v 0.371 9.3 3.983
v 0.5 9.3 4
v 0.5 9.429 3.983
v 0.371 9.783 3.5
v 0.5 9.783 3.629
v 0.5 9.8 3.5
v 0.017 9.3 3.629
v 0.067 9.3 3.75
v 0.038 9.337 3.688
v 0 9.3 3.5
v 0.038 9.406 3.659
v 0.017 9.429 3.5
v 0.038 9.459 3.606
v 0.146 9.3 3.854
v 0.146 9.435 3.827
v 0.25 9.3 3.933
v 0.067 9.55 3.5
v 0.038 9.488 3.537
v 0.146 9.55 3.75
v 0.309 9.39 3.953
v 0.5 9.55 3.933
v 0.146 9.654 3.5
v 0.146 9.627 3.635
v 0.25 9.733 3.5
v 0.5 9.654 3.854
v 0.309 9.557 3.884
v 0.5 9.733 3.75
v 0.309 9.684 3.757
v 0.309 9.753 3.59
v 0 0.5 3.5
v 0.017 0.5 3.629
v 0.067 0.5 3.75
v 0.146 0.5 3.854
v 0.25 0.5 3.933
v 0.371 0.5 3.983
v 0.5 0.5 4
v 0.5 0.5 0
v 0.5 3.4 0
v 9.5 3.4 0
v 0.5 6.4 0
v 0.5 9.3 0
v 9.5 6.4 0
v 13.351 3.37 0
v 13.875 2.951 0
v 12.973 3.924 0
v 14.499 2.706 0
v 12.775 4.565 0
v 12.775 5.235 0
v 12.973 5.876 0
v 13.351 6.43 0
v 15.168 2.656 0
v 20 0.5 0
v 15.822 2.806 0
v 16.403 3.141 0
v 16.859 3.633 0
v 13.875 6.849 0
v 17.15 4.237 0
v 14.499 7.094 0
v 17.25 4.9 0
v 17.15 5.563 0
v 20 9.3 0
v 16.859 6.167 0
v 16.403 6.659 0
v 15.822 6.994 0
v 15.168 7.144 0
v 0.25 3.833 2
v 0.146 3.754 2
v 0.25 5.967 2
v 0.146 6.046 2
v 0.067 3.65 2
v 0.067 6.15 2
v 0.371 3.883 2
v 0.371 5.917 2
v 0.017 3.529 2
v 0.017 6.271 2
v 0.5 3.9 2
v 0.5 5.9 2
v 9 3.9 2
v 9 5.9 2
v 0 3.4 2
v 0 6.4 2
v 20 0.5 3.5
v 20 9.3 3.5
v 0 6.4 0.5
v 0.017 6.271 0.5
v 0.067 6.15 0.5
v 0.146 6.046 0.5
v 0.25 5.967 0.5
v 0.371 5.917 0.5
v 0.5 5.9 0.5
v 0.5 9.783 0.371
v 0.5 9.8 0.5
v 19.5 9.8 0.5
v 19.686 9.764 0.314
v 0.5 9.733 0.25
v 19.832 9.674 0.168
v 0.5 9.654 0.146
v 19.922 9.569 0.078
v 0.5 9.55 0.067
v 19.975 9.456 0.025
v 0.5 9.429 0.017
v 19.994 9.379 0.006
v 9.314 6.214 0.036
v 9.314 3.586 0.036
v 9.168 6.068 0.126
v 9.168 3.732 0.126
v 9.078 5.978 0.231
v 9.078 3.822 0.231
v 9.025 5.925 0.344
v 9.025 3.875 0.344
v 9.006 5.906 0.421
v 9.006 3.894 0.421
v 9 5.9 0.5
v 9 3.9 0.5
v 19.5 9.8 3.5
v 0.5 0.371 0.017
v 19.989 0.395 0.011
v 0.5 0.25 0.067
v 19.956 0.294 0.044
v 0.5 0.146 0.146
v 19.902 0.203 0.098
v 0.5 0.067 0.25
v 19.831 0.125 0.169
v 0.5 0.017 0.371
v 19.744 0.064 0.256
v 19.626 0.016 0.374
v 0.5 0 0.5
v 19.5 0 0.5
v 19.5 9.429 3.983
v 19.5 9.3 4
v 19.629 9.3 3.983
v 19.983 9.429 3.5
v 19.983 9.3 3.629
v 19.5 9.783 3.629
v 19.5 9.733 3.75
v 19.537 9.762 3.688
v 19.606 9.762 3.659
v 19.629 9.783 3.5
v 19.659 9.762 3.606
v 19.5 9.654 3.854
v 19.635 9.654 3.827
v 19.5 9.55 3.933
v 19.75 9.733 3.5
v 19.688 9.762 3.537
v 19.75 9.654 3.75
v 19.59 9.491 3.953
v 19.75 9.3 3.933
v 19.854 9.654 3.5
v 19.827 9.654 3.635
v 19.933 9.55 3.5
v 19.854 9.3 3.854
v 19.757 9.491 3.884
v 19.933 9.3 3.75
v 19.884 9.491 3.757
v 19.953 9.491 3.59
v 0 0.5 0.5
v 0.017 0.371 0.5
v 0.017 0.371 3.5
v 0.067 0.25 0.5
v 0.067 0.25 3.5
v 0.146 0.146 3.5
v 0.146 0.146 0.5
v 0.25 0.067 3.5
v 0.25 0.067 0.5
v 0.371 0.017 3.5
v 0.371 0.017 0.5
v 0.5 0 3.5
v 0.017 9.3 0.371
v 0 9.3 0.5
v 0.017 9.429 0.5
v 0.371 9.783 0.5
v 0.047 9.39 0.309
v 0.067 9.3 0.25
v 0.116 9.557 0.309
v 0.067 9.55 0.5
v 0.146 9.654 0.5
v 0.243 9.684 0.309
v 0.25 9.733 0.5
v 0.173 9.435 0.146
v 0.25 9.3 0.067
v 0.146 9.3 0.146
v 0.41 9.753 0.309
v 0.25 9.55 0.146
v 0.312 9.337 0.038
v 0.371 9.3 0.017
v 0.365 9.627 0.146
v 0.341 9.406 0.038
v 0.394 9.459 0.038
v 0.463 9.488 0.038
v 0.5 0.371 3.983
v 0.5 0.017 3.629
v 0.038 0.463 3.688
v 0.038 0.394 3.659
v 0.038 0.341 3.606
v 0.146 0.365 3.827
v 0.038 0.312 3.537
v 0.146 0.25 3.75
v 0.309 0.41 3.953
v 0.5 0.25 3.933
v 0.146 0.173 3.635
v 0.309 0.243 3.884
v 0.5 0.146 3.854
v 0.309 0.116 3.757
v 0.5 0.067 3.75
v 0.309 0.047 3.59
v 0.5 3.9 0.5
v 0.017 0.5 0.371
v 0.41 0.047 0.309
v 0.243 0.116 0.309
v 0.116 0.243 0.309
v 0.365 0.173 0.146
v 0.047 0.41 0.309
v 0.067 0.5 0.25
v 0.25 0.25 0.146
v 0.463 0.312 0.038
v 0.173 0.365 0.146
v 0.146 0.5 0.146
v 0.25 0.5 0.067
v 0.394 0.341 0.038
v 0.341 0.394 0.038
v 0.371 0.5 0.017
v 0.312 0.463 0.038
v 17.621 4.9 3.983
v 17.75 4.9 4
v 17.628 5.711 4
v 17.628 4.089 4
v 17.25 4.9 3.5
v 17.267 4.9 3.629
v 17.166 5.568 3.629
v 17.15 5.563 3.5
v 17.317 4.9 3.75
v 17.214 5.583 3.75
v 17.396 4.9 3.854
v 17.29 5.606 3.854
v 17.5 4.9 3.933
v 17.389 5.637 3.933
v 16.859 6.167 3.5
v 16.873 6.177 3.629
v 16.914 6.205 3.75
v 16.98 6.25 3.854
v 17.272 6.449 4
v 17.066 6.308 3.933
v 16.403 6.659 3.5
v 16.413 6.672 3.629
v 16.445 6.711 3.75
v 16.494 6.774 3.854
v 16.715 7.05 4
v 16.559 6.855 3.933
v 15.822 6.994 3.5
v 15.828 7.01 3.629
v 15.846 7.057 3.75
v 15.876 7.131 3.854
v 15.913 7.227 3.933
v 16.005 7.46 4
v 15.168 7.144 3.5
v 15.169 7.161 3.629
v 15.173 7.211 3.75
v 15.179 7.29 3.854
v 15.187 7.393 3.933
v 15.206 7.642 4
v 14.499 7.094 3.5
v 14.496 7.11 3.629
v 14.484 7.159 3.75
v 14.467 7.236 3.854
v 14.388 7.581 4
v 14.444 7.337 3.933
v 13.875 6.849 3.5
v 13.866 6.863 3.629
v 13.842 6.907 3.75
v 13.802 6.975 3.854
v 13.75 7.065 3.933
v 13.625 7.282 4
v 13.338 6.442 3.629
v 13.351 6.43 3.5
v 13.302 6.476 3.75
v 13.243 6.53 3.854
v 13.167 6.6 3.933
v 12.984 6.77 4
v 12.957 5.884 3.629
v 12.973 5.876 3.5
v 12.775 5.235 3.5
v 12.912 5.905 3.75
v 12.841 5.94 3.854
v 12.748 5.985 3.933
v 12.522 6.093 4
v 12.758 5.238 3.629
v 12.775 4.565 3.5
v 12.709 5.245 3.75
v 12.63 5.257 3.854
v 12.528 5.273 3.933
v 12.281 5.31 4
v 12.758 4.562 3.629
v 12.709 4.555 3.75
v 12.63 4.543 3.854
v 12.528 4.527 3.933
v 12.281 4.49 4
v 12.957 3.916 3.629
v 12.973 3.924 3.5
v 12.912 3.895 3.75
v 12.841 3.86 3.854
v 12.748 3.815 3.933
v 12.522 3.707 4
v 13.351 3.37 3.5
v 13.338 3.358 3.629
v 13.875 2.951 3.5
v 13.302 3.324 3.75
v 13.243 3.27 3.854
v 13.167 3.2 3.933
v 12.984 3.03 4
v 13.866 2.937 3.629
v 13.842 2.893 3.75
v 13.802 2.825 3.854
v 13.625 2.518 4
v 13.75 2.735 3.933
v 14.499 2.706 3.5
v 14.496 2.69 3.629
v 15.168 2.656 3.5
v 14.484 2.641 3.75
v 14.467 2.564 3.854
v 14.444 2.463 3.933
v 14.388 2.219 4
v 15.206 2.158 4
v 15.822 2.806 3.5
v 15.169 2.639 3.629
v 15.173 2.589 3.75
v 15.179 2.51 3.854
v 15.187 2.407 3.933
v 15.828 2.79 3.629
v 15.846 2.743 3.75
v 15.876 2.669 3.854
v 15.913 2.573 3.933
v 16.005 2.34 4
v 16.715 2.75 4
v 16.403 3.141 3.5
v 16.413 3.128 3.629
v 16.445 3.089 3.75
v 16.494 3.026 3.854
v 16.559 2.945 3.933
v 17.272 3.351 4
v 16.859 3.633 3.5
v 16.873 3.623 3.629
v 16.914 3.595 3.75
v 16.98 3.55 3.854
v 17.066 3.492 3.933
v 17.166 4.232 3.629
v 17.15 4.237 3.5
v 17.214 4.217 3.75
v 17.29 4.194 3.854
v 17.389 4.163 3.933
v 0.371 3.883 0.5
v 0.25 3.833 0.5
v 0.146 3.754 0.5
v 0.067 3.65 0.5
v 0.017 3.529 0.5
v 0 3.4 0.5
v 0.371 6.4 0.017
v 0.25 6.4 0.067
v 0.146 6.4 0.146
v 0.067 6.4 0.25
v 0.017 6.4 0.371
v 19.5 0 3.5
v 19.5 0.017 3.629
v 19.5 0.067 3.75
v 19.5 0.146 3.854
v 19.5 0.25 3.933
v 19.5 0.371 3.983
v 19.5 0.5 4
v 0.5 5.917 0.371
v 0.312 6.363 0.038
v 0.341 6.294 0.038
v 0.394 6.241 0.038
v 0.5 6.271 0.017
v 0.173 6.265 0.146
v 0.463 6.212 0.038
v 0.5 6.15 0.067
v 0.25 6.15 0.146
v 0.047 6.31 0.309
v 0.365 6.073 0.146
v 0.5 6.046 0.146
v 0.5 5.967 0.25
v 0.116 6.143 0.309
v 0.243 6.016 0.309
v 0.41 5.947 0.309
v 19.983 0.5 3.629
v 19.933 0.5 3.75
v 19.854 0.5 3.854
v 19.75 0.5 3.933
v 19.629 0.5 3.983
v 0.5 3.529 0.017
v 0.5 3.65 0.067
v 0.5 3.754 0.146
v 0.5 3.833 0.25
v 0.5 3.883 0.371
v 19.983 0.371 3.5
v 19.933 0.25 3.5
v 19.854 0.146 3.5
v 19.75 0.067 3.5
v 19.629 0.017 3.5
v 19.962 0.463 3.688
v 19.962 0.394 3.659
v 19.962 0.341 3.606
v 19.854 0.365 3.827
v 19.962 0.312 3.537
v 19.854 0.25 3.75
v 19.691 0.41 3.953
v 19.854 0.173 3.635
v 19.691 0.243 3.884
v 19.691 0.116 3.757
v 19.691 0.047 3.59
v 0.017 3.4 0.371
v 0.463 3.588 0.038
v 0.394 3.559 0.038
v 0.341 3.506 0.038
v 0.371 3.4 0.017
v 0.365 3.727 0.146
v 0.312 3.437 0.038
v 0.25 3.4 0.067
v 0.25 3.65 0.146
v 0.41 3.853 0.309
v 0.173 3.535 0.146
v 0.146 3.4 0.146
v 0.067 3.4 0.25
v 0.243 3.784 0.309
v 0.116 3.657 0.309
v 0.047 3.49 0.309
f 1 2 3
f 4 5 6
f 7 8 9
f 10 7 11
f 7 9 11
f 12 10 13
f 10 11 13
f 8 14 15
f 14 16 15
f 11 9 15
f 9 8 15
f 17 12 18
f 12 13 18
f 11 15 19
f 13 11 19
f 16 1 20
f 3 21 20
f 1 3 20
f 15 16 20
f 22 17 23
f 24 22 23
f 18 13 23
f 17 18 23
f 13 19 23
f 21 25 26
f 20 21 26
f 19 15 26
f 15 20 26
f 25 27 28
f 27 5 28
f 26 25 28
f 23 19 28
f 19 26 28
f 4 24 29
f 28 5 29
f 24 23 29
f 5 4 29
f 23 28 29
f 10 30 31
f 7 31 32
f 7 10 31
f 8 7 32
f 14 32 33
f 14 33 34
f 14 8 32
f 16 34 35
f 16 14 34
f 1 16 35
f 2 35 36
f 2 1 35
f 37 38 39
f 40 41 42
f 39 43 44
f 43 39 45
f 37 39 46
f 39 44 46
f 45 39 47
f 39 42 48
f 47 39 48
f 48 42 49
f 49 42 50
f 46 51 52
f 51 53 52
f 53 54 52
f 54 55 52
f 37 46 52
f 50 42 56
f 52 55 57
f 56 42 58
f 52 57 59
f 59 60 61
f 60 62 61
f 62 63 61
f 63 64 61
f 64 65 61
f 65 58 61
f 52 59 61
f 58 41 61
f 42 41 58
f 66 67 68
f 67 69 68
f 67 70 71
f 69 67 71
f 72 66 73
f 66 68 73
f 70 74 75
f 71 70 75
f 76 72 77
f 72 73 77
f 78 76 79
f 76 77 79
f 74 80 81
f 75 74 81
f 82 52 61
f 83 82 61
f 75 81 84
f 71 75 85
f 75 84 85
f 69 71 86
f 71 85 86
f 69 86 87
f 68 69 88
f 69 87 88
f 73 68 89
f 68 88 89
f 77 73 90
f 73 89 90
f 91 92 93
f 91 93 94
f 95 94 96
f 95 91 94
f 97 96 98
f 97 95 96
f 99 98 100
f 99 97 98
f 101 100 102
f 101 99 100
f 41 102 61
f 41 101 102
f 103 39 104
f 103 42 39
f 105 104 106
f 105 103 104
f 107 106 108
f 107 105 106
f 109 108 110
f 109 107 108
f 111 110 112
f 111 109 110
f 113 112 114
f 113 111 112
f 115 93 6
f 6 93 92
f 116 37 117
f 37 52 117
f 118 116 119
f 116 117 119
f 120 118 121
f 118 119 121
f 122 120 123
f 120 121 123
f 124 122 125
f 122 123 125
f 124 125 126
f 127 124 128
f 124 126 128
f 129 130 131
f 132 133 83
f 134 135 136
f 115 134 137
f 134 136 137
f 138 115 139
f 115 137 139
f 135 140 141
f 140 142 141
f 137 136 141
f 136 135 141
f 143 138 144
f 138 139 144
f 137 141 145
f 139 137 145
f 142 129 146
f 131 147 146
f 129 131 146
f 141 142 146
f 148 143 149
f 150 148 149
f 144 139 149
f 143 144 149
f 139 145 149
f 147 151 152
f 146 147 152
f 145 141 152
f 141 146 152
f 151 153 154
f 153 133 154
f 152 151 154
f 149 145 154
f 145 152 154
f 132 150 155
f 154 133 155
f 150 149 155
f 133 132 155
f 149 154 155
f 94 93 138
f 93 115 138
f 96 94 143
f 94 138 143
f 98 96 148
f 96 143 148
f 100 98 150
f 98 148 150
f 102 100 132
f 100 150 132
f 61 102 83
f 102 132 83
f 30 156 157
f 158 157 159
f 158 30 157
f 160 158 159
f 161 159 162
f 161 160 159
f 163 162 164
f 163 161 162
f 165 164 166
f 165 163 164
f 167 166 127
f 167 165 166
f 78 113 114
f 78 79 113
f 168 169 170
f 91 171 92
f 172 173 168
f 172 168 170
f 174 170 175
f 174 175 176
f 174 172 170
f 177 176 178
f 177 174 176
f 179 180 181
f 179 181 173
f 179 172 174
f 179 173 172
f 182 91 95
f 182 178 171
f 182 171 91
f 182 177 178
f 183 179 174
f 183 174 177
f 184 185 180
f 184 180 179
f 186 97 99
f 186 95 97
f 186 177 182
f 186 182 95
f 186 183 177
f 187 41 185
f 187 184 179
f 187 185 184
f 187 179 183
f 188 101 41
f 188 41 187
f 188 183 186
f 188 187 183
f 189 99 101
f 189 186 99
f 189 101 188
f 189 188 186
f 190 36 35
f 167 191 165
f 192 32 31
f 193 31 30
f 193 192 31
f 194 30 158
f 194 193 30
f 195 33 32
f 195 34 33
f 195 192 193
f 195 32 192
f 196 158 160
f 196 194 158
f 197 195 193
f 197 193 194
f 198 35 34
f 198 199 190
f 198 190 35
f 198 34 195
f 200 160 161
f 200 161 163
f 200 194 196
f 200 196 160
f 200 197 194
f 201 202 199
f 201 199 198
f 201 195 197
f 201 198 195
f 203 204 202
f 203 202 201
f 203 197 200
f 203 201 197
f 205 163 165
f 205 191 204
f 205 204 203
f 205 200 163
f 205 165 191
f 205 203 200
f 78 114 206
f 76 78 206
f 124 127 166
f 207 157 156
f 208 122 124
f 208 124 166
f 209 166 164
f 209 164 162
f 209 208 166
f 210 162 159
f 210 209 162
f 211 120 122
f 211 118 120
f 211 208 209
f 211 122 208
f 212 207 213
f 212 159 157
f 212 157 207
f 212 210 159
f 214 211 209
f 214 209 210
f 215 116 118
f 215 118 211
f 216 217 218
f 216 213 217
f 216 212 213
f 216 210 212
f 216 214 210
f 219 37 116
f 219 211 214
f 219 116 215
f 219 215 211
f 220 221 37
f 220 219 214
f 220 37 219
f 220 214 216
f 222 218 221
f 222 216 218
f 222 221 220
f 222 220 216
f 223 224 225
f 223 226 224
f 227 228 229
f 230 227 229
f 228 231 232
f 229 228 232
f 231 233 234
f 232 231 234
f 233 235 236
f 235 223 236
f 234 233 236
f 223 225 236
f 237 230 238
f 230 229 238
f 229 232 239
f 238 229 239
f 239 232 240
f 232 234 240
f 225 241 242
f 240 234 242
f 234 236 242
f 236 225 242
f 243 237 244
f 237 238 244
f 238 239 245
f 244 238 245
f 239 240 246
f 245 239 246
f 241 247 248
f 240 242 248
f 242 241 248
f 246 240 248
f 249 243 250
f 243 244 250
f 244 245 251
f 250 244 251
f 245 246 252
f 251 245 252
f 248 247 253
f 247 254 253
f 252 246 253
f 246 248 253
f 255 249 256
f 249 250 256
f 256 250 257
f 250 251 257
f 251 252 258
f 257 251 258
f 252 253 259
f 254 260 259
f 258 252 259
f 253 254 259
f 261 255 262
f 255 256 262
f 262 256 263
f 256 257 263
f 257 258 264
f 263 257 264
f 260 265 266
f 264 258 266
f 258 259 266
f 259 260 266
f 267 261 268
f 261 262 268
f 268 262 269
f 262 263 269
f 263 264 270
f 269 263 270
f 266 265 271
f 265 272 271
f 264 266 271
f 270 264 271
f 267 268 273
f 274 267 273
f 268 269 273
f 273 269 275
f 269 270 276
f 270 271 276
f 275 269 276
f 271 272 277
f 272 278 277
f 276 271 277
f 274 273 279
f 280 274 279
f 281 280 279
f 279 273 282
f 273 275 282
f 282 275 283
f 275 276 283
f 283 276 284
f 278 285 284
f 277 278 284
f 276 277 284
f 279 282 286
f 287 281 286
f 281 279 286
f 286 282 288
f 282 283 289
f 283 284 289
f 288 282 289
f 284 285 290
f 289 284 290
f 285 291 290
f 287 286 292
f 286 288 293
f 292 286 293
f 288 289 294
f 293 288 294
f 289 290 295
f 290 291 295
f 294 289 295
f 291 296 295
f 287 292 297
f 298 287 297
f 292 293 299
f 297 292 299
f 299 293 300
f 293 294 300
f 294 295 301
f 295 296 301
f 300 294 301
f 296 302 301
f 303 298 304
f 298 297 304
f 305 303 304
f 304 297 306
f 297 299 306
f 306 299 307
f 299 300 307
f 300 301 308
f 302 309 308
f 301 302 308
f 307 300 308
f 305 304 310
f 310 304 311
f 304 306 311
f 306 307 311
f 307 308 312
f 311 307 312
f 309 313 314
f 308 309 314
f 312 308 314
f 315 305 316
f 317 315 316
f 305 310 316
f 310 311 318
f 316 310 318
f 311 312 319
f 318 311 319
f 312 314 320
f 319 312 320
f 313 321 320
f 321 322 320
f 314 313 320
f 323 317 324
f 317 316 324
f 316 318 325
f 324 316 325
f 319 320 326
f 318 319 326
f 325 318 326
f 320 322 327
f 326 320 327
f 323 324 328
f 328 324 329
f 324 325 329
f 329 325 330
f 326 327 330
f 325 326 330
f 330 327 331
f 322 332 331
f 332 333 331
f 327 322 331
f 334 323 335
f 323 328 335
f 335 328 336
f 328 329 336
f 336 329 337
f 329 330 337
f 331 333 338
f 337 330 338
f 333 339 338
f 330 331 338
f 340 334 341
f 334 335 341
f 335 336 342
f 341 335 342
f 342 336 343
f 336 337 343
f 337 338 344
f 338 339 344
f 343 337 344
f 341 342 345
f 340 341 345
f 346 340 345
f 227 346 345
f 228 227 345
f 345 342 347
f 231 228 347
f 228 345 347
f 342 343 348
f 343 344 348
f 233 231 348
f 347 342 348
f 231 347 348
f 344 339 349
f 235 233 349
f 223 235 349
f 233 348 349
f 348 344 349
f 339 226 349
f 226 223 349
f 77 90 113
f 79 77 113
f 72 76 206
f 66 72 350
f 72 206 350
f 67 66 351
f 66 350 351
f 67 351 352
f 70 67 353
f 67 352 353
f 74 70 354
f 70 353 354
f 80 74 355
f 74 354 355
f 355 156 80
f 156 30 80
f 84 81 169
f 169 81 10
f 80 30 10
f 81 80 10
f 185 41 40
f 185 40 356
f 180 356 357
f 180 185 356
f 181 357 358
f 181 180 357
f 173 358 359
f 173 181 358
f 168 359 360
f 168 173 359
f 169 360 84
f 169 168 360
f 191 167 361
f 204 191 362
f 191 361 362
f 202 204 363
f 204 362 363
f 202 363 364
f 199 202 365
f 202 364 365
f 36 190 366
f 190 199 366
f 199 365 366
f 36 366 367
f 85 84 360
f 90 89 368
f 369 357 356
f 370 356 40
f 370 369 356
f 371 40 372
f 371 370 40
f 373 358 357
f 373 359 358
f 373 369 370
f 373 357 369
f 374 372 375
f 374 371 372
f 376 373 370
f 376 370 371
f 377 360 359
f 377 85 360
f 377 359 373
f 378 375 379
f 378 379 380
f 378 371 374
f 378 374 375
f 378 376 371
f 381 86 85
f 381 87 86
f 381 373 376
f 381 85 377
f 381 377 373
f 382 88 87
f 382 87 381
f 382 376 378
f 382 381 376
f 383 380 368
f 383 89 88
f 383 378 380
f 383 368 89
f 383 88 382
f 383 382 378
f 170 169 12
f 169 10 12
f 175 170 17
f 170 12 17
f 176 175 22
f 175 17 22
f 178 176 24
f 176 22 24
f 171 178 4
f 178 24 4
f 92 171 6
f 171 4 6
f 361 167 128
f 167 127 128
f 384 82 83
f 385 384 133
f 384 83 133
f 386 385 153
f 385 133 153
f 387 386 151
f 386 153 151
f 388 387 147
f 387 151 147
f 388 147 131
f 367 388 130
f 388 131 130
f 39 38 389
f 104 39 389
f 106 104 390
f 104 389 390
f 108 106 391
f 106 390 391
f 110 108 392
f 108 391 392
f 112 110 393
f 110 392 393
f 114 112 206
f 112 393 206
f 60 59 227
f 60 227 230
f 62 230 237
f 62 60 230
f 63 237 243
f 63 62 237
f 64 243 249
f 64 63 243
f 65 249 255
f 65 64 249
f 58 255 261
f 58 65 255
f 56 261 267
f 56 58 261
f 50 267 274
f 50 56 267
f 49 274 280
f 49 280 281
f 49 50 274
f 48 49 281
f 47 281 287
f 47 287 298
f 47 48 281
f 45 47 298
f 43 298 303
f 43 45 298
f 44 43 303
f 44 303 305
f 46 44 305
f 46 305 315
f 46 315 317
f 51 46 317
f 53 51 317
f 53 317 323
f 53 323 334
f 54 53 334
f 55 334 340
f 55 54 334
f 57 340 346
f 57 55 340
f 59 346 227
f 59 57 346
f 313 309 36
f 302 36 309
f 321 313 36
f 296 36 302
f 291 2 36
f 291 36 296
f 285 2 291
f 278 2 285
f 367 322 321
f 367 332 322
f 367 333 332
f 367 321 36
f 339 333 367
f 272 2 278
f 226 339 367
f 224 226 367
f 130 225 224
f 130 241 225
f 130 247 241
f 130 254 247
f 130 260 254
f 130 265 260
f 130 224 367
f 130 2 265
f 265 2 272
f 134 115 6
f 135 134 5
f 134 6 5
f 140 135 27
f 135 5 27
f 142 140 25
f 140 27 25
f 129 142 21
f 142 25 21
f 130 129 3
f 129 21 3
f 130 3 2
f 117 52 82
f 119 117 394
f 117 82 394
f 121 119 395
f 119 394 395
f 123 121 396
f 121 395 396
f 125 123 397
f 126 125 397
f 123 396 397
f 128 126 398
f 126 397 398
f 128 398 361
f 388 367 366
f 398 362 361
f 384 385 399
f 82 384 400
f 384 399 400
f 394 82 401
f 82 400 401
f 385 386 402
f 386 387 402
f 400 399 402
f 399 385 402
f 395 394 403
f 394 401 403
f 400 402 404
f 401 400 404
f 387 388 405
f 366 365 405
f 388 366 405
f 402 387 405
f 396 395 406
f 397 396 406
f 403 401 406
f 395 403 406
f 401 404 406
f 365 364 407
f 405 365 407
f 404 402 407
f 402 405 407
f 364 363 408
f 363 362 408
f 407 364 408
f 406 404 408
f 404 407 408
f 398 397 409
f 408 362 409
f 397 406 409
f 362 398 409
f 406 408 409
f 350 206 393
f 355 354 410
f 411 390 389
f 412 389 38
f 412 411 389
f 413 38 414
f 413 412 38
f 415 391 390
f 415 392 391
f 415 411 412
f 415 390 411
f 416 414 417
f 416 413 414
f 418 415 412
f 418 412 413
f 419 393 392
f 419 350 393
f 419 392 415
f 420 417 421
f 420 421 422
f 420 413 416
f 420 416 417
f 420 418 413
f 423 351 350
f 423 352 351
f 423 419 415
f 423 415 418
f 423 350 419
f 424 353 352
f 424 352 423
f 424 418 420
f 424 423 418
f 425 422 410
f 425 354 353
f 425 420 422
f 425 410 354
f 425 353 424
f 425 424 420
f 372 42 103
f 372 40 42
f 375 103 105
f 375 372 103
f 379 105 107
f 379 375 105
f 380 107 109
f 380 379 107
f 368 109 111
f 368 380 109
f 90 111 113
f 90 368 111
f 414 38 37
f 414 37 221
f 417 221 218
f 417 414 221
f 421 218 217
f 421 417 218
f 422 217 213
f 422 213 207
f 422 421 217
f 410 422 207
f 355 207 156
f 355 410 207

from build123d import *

# Parameters (mm, degrees)
F0_R         = 2.25
F1_DEPTH     = 4
F2_W         = 9
F2_H         = 3
F3_DEPTH     = 2
F4_R         = 0.5
F5_T1_DEPTH  = 8.5
F5_T3_DEPTH  = 2
F5_T5_DEPTH  = 2.9
F5_T7_DEPTH  = 2.9
F5_S11_W     = 0.5
F5_S11_H     = 0.5
F5_T12_DEPTH = 0.5
F5_S17_W     = 0.5
F5_S17_H     = 0.5
F5_T18_DEPTH = 0.5
F5_T22_ANGLE = 90
F5_T24_ANGLE = 90
F5_T29_DEPTH = 9.75
F5_T33_DEPTH = 3.25
F5_T40_DEPTH = 9.75
F5_T44_DEPTH = 3.25


# Not quite as in the source:
# - a fillet or chamfer that OpenCascade refuses, or shapes differently, is made with other operations: its cross-section is extruded or revolved along the edge and cut away or added


with BuildPart() as f1:
    # F0 (on Top) → F1 (new body)
    with BuildSketch(Plane.XY):
        with BuildLine():
            Line((20, 0), (20, 9.8))
            Line((20, 9.8), (0, 9.8))
            Line((0, 9.8), (0, 6.4))
            ThreePointArc((0, 6.4), (0.1464466094, 6.0464466094), (0.5, 5.9))
            Line((0.5, 5.9), (9, 5.9))
            Line((9, 5.9), (9, 3.9))
            Line((9, 3.9), (0.5, 3.9))
            ThreePointArc((0.5, 3.9), (0.1464466094, 3.7535533906), (0, 3.4))
            Line((0, 3.4), (0, 0))
            Line((0, 0), (20, 0))
        make_face()
        with Locations((15, 4.9)):
            Circle(F0_R, mode=Mode.SUBTRACT)
    extrude(amount=F1_DEPTH)

    # F2 (on face) → F3 (join)
    with BuildSketch(Plane.XY.offset(4)):
        with Locations((4.5, 4.9)):
            Rectangle(F2_W, F2_H)
    extrude(amount=-F3_DEPTH)

    # F4
    f4_edges = [f1.edges().sort_by_distance(p)[0] for p in [
        (10, 0, 4),
        (20, 4.9, 4),
        (10, 9.8, 4),
        (0, 4.9, 4),
        (12.75, 4.9, 4),
        (20, 9.8, 2),
        (0, 9.8, 2),
        (10, 9.8, 0),
        (0, 0, 2),
        (20, 0, 2),
        (10, 0, 0),
    ]]
    fillet(f4_edges, radius=F4_R)

    # F5: fillet of radius 0.5 on 3 edges, made by hand

    # F5_s2 → F5_t1 (cut)
    with BuildSketch(Plane.YZ.offset(0.5)):
        with BuildLine():
            ThreePointArc((6.4, 0), (6.0464466094, 0.1464466094), (5.9, 0.5))
            Line((5.9, 0.5), (5.9, 0))
            Line((5.9, 0), (6.4, 0))
        make_face()
        with BuildLine():
            ThreePointArc((3.4, 0), (3.7535533906, 0.1464466094), (3.9, 0.5))
            Line((3.9, 0.5), (3.9, 0))
            Line((3.9, 0), (3.4, 0))
        make_face()
    extrude(amount=F5_T1_DEPTH, mode=Mode.SUBTRACT)

    # F5_s4 → F5_t3 (cut)
    with BuildSketch(Plane.XZ.offset(-5.9)):
        with BuildLine():
            ThreePointArc((9.5, 0), (9.1464466094, 0.1464466094), (9, 0.5))
            Line((9, 0.5), (9, 0))
            Line((9, 0), (9.5, 0))
        make_face()
    extrude(amount=F5_T3_DEPTH, mode=Mode.SUBTRACT)

    # F5_s6 → F5_t5 (cut)
    with BuildSketch(Plane.XZ.offset(-3.4)):
        with BuildLine():
            ThreePointArc((0.5, 0), (0.1464466094, 0.1464466094), (0, 0.5))
            Line((0, 0.5), (0, 0))
            Line((0, 0), (0.5, 0))
        make_face()
    extrude(amount=F5_T5_DEPTH, mode=Mode.SUBTRACT)

    # F5_s8 → F5_t7 (cut)
    with BuildSketch(Plane.XZ.offset(-9.3)):
        with BuildLine():
            ThreePointArc((0.5, 0), (0.1464466094, 0.1464466094), (0, 0.5))
            Line((0, 0.5), (0, 0))
            Line((0, 0), (0.5, 0))
        make_face()
    extrude(amount=F5_T7_DEPTH, mode=Mode.SUBTRACT)


with BuildPart() as f5_tool10:
    # F5_s11 → F5_t12 (new body)
    with BuildSketch(Plane.XY.offset(0.5)):
        with Locations((0.25, 0.25)):
            Rectangle(F5_S11_W, F5_S11_H)
    extrude(amount=-F5_T12_DEPTH)

    # F5_s13 → F5_t14 (revolve, cut)
    with BuildSketch(Plane(origin=(0.5, 0.5, 0.5), x_dir=(0.7071067812, 0.7071067812, 0), z_dir=(-0.7071067812, 0.7071067812, 0))):
        with BuildLine():
            ThreePointArc((0, -0.5), (0.5, 0), (0, 0.5))
            Line((0, 0.5), (0, -0.5))
        make_face()
    revolve(axis=Axis((0.5, 0.5, 0.5), (0, 0, -1)), mode=Mode.SUBTRACT)


with BuildPart() as f1_1:
    add(f1.part)

    # F5_t9: cut F5_tool10
    add(f5_tool10.part, mode=Mode.SUBTRACT)


with BuildPart() as f5_tool16:
    # F5_s17 → F5_t18 (new body)
    with BuildSketch(Plane.XY.offset(0.5)):
        with Locations((0.25, 9.55)):
            Rectangle(F5_S17_W, F5_S17_H)
    extrude(amount=-F5_T18_DEPTH)

    # F5_s19 → F5_t20 (revolve, cut)
    with BuildSketch(Plane(origin=(0.5, 9.3, 0.5), x_dir=(0.7071067812, -0.7071067812, 0), z_dir=(0.7071067812, 0.7071067812, 0))):
        with BuildLine():
            ThreePointArc((0, -0.5), (0.5, 0), (0, 0.5))
            Line((0, 0.5), (0, -0.5))
        make_face()
    revolve(axis=Axis((0.5, 9.3, 0.5), (0, 0, -1)), mode=Mode.SUBTRACT)


with BuildPart() as f1_2:
    add(f1_1.part)

    # F5_t15: cut F5_tool16
    add(f5_tool16.part, mode=Mode.SUBTRACT)

    # F5_s21 → F5_t22 (revolve, cut)
    with BuildSketch(Plane.YZ.offset(0.5)):
        with BuildLine():
            ThreePointArc((3.4, 0), (3.7535533906, 0.1464466094), (3.9, 0.5))
            Line((3.9, 0.5), (3.9, 0))
            Line((3.9, 0), (3.4, 0))
        make_face()
    revolve(axis=Axis((0.5, 3.4, 0), (0, 0, 1)), revolution_arc=F5_T22_ANGLE, mode=Mode.SUBTRACT)

    # F5_s23 → F5_t24 (revolve, cut)
    with BuildSketch(Plane.XZ.offset(-6.4)):
        with BuildLine():
            ThreePointArc((0.5, 0), (0.1464466094, 0.1464466094), (0, 0.5))
            Line((0, 0.5), (0, 0))
            Line((0, 0), (0.5, 0))
        make_face()
    revolve(axis=Axis((0.5, 6.4, 0), (0, 0, 1)), revolution_arc=F5_T24_ANGLE, mode=Mode.SUBTRACT)


with BuildPart() as f5_tool27:
    # F5_s28 → F5_t29 (new body)
    with BuildSketch(Plane.YZ.offset(0.5)):
        with BuildLine():
            ThreePointArc((6.4, 0), (6.0464466094, 0.1464466094), (5.9, 0.5))
            Line((5.9, 0.5), (5.9, 0))
            Line((5.9, 0), (6.4, 0))
        make_face()
    extrude(amount=F5_T29_DEPTH)

    split(bisect_by=Plane.YZ.offset(9), keep=Keep.TOP)


with BuildPart() as f5_tool31:
    # F5_s32 → F5_t33 (new body)
    with BuildSketch(Plane.XZ.offset(-7.15)):
        with BuildLine():
            ThreePointArc((9.5, 0), (9.1464466094, 0.1464466094), (9, 0.5))
            Line((9, 0.5), (9, 0))
            Line((9, 0), (9.5, 0))
        make_face()
    extrude(amount=F5_T33_DEPTH)

    split(bisect_by=Plane.XZ.offset(-5.9), keep=Keep.BOTTOM)


with BuildPart() as f5_tool27_1:
    add(f5_tool27.part)

    # F5_t35: intersect F5_tool31
    add(f5_tool31.part, mode=Mode.INTERSECT)


with BuildPart() as f1_3:
    add(f1_2.part)

    # F5_t25: cut F5_tool27
    add(f5_tool27_1.part, mode=Mode.SUBTRACT)


with BuildPart() as f5_tool38:
    # F5_s39 → F5_t40 (new body)
    with BuildSketch(Plane.YZ.offset(10.25)):
        with BuildLine():
            ThreePointArc((3.4, 0), (3.7535533906, 0.1464466094), (3.9, 0.5))
            Line((3.9, 0.5), (3.9, 0))
            Line((3.9, 0), (3.4, 0))
        make_face()
    extrude(amount=-F5_T40_DEPTH)

    split(bisect_by=Plane.YZ.offset(9), keep=Keep.TOP)


with BuildPart() as f5_tool42:
    # F5_s43 → F5_t44 (new body)
    with BuildSketch(Plane.XZ.offset(-5.9)):
        with BuildLine():
            ThreePointArc((9.5, 0), (9.1464466094, 0.1464466094), (9, 0.5))
            Line((9, 0.5), (9, 0))
            Line((9, 0), (9.5, 0))
        make_face()
    extrude(amount=F5_T44_DEPTH)

    split(bisect_by=Plane.XZ.offset(-3.9), keep=Keep.TOP)


with BuildPart() as f5_tool38_1:
    add(f5_tool38.part)

    # F5_t46: intersect F5_tool42
    add(f5_tool42.part, mode=Mode.INTERSECT)


with BuildPart() as f1_4:
    add(f1_3.part)

    # F5_t36: cut F5_tool38
    add(f5_tool38_1.part, mode=Mode.SUBTRACT)


solid = f1_4.part
